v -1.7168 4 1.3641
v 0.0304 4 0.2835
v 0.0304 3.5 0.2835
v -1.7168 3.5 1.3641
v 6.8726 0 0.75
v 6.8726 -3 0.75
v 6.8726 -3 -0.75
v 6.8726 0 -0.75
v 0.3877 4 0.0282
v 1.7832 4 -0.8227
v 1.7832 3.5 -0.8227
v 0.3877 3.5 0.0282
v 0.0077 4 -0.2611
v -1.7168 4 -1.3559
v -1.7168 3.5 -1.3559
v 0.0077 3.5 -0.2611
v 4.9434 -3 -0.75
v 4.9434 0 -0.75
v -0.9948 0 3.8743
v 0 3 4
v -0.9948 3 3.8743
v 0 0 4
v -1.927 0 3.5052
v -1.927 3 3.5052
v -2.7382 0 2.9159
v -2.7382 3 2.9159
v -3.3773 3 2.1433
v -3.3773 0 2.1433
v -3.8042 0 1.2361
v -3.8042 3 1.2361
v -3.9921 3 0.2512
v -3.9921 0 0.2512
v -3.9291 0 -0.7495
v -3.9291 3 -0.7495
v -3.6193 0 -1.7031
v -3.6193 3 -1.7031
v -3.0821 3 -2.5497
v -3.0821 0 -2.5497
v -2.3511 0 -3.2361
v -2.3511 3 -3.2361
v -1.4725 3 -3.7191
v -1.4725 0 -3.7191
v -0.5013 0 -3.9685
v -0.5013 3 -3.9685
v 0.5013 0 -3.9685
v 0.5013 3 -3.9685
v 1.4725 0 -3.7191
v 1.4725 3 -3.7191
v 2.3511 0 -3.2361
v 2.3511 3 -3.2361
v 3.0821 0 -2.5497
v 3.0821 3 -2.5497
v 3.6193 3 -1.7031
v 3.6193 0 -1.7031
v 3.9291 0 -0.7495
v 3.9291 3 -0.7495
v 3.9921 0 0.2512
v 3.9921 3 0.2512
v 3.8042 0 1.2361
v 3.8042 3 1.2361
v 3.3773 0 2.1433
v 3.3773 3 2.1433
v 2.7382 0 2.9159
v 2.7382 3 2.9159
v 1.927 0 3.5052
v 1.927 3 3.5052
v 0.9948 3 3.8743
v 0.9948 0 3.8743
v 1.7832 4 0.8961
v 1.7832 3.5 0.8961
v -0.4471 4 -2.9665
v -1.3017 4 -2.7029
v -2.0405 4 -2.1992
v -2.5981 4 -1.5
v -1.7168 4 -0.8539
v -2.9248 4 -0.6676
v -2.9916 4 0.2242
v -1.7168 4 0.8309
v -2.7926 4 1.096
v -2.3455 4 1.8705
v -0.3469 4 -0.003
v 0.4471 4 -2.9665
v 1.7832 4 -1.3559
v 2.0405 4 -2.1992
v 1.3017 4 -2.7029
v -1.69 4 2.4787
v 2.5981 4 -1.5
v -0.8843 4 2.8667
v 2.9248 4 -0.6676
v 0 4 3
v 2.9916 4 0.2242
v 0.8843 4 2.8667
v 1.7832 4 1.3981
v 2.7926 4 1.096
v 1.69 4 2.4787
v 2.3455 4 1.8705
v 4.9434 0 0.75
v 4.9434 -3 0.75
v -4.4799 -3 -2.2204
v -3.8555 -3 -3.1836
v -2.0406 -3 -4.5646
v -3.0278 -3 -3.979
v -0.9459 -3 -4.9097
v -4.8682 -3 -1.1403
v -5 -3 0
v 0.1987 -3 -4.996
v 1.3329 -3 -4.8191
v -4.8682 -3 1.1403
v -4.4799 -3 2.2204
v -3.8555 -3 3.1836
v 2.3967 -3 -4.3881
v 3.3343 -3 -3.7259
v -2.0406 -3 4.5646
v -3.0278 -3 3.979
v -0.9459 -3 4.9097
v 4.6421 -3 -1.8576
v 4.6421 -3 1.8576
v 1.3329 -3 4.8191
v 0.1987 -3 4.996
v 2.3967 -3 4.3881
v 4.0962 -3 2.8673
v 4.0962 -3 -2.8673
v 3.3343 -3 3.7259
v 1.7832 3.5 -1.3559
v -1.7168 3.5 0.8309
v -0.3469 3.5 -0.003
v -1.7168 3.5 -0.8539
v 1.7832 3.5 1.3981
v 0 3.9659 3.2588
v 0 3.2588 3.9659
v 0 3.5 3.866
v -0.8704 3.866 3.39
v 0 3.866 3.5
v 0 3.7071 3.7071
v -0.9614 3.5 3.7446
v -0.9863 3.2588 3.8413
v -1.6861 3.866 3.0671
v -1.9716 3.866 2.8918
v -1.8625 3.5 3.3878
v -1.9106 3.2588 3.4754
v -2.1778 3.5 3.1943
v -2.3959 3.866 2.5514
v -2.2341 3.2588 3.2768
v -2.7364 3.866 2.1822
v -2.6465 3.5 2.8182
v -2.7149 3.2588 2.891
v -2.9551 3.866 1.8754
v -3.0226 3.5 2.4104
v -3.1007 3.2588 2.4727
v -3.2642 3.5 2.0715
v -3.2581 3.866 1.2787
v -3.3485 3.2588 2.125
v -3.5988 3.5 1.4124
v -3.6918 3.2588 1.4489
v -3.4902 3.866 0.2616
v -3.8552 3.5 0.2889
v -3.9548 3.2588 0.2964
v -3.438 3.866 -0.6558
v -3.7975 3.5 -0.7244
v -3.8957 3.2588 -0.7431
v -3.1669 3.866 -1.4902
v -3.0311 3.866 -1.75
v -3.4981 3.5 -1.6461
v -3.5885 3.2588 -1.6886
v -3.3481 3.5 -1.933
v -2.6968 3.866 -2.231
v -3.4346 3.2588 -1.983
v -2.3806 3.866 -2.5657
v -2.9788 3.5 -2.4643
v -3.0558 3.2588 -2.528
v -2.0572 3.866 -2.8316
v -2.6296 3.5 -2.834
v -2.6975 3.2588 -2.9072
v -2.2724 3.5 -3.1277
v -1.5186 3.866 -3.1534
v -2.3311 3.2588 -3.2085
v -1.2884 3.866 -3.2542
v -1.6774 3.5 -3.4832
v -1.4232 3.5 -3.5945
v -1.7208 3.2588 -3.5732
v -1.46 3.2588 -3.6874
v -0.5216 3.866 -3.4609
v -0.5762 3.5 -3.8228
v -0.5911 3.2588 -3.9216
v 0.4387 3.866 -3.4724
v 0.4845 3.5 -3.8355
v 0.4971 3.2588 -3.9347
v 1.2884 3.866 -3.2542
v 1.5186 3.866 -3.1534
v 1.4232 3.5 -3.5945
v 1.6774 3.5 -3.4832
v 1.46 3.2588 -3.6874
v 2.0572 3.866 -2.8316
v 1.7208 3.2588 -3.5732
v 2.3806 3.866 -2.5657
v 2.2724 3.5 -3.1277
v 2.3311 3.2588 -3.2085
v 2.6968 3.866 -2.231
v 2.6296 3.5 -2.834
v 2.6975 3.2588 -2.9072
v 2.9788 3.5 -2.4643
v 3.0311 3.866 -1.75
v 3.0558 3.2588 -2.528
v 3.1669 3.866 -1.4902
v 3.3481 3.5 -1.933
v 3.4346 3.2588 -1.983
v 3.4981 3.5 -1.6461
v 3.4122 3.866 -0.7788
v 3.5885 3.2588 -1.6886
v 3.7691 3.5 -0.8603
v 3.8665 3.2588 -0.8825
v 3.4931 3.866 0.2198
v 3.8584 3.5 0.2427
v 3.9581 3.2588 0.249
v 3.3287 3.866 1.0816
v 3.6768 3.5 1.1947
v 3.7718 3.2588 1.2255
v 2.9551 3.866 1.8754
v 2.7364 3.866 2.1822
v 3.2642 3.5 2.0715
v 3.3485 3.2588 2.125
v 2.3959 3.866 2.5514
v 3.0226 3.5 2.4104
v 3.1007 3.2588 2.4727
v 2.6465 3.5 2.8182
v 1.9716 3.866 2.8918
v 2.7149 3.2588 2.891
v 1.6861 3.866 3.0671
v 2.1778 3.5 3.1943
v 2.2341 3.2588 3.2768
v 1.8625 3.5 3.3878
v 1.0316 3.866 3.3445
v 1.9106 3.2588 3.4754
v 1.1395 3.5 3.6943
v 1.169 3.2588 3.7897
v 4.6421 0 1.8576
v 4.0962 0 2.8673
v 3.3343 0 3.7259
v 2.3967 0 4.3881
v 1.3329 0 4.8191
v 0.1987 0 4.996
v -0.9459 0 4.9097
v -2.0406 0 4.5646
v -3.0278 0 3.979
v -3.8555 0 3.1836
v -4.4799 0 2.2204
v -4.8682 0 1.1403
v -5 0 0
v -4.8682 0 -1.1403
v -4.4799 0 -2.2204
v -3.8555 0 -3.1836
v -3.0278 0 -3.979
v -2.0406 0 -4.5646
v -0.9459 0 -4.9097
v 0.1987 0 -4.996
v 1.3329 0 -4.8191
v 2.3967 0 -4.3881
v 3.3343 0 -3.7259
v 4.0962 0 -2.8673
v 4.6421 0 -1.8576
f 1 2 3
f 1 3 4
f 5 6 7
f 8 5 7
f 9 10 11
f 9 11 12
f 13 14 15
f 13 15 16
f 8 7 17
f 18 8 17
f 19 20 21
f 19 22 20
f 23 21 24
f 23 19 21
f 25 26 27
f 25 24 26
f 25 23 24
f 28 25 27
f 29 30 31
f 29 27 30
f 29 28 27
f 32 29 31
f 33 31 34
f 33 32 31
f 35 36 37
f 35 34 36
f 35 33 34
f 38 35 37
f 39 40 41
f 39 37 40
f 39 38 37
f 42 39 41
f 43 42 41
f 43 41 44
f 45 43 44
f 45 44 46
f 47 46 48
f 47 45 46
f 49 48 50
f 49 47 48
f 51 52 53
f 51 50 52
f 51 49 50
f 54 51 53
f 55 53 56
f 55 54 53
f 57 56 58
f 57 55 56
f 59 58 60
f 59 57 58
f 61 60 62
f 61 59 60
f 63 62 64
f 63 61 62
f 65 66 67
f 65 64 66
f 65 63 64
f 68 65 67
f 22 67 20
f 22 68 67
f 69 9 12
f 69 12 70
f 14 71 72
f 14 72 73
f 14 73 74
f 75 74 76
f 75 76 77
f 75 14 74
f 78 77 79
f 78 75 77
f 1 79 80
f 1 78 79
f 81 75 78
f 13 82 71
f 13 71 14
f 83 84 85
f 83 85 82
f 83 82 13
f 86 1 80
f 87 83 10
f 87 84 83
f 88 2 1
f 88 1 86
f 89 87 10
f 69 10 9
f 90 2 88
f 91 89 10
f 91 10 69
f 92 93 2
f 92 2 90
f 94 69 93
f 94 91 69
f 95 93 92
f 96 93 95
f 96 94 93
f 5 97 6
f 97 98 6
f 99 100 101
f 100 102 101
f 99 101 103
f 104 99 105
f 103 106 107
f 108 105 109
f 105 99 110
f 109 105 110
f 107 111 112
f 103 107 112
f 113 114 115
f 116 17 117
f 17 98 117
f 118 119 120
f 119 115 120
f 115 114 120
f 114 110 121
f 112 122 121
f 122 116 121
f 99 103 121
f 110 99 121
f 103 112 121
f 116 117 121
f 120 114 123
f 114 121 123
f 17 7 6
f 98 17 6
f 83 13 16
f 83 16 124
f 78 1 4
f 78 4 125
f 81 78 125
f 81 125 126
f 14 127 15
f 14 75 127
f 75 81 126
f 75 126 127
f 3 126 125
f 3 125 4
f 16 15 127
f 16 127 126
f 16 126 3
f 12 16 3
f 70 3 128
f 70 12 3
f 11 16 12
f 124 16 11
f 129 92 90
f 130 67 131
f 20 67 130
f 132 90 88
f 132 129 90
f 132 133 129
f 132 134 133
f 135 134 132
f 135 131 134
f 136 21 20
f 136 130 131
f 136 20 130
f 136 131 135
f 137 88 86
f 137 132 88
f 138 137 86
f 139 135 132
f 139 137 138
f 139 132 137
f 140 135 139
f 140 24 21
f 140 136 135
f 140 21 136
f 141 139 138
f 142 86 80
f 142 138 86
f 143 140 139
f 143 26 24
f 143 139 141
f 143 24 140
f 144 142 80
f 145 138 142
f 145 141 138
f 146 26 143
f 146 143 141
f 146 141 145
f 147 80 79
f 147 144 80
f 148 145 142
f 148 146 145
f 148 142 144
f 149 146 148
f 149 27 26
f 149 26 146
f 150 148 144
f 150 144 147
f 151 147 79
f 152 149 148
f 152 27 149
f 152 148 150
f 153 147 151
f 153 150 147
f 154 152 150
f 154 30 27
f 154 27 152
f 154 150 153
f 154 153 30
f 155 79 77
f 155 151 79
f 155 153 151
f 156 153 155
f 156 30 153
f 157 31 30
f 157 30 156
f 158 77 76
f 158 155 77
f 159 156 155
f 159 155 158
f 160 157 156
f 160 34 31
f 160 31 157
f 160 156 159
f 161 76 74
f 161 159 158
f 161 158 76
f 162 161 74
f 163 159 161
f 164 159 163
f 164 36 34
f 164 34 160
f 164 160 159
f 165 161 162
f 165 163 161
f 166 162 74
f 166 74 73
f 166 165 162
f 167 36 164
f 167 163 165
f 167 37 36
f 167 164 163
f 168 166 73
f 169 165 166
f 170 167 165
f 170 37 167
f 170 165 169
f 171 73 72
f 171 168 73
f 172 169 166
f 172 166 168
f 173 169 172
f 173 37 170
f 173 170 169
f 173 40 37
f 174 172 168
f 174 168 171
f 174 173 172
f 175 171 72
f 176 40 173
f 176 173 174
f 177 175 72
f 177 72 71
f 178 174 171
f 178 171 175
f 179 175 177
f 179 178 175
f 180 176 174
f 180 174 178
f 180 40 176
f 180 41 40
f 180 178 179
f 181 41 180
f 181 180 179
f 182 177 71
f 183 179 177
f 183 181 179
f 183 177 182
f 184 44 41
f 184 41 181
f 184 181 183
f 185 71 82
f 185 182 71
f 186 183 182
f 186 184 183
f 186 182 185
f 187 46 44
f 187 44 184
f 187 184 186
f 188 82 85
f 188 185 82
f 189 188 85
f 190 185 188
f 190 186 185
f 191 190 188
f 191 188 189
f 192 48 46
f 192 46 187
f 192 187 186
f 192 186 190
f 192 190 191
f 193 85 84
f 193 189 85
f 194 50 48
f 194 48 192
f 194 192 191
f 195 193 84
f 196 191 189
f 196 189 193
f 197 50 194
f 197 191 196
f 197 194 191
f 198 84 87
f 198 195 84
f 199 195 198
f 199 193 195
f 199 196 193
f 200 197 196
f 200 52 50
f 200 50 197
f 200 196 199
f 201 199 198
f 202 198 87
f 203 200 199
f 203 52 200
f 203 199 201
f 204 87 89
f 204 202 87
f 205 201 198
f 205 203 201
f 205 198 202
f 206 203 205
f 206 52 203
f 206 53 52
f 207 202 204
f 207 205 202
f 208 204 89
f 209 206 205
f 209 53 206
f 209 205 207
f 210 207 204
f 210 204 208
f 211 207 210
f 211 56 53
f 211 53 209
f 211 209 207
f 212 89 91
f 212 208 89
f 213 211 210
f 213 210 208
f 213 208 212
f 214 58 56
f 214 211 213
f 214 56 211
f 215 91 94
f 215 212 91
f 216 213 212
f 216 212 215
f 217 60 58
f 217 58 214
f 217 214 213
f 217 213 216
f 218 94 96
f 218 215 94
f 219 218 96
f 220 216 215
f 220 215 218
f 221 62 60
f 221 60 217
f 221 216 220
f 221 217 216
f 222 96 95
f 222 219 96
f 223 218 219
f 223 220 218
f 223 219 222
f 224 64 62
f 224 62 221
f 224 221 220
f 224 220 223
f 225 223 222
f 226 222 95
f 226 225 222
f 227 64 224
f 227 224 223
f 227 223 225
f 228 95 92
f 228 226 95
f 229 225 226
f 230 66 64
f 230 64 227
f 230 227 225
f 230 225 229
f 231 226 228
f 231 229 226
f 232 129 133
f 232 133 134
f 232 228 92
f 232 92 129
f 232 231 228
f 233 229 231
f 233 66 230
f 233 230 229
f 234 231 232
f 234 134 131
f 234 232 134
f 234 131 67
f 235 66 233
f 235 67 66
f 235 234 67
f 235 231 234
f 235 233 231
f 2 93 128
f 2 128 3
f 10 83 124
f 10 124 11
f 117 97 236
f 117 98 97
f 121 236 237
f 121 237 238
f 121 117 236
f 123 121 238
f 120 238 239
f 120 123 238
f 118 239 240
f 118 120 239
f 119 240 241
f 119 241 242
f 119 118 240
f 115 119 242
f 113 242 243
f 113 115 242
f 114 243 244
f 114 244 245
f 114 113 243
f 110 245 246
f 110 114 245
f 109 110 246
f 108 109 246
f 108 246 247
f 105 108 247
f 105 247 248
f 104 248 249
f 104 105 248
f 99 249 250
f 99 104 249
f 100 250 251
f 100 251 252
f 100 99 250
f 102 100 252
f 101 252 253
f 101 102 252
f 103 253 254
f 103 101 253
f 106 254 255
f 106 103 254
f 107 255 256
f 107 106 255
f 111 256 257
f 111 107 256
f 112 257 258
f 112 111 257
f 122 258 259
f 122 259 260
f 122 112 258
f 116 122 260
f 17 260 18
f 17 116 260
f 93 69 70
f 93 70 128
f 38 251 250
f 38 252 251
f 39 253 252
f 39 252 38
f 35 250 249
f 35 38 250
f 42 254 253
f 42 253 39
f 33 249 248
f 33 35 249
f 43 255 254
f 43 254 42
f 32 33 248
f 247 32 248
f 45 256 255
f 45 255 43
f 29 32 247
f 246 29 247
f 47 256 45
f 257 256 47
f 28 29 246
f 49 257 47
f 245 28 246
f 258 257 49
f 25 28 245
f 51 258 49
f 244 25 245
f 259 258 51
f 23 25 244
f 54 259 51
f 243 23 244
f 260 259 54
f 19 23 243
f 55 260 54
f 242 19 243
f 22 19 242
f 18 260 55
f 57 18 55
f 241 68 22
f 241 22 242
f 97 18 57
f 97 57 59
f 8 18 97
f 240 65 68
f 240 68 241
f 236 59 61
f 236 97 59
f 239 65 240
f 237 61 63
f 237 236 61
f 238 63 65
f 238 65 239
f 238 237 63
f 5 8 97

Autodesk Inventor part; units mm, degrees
ref_plane "YZ Plane" through (0, 0, 0) normal (1, 0, 0) x (0, 1, 0)
ref_plane "XZ Plane" through (0, 0, 0) normal (0, 1, 0) x (-1, 0, 0)
ref_plane "XY Plane" through (0, 0, 0) normal (0, 0, 1) x (1, 0, 0)
sketch "Skizze1" plane through (0, 0, 0) normal (1, 0, 0) x (0, 1, 0)
  line L0 (4, 0) -> (4, 3)
  arc A0 (4, 3) -> (3, 4) centre (3, 3) ccw
  line L1 (3, 4) -> (0, 4)
  line L2 (0, 4) -> (0, 5)
  line L3 (0, 5) -> (-3, 5)
  line L4 (-3, 5) -> (-3, 2)
  line L5 (0, 0) -> (4, 0)
  line L6 (-3, 2) -> (-3, 0)
  line L7 (-3, 0) -> (0, 0)
  point P0 (0, 2)
  dimension "d0" = 2
  dimension "d1" = 4
  dimension "d2" = 3
  dimension "d3" = 5
  dimension "d4" = 3
  dimension "d5" = 1
  dimension "d6" = 1
revolve "Umdrehung1" add sketch "Skizze1" angle 360 about axis through (0, 0, 0) along (0, 1, 0)
sketch "Skizze2" plane through (0, 4, 0) normal (0, 1, 0) x (1, 0, 0)
  line L0 (-1.7168, -1.418) -> (-1.7168, 1.5147) construction
  line L1 (-1.7168, 1.5147) -> (1.7832, 1.5147) construction
  line L2 (1.7832, 1.5147) -> (1.7832, -1.418) construction
  line L3 (1.7832, -1.418) -> (-1.7168, -1.418) construction
  line L4 (1.7832, 1.3559) -> (1.7832, 0.8227)
  line L5 (1.7832, 0.8227) -> (0.3877, -0.0282)
  line L6 (0.3877, -0.0282) -> (1.7832, -0.8961)
  line L7 (1.7832, -0.8961) -> (1.7832, -1.3981)
  line L8 (1.7832, -1.3981) -> (0.0304, -0.2835)
  line L9 (0.0304, -0.2835) -> (-1.7168, -1.3641)
  line L10 (-1.7168, -1.3641) -> (-1.7168, -0.8309)
  line L11 (-1.7168, -0.8309) -> (-0.3469, 0.003)
  line L12 (-0.3469, 0.003) -> (-1.7168, 0.8539)
  line L13 (-1.7168, 0.8539) -> (-1.7168, 1.3559)
  line L14 (-1.7168, 1.3559) -> (0.0077, 0.2611)
  line L15 (0.0077, 0.2611) -> (1.7832, 1.3559)
  point P0 (0, 0)
extrude "Extrusion1" cut sketch "Skizze2" against normal blind 0.5
sketch "Skizze4" plane through (0, -3, 0) normal (0, -1, 0) x (1, 0, 0)
  line L0 (4.8726, 0.75) -> (6.8726, 0.75)
  line L1 (6.8726, 0.75) -> (6.8726, -0.75)
  line L2 (6.8726, -0.75) -> (4.8726, -0.75)
  line L3 (4.8726, -0.75) -> (4.8726, 0.75)
  point P0 (0, 0)
  dimension "d15" = 1.5
  dimension "d16" = 2
  dimension "d17" = 0.75
extrude "Extrusion3" add sketch "Skizze4" against normal blind 3
properties part number "ButtonX_neu"
